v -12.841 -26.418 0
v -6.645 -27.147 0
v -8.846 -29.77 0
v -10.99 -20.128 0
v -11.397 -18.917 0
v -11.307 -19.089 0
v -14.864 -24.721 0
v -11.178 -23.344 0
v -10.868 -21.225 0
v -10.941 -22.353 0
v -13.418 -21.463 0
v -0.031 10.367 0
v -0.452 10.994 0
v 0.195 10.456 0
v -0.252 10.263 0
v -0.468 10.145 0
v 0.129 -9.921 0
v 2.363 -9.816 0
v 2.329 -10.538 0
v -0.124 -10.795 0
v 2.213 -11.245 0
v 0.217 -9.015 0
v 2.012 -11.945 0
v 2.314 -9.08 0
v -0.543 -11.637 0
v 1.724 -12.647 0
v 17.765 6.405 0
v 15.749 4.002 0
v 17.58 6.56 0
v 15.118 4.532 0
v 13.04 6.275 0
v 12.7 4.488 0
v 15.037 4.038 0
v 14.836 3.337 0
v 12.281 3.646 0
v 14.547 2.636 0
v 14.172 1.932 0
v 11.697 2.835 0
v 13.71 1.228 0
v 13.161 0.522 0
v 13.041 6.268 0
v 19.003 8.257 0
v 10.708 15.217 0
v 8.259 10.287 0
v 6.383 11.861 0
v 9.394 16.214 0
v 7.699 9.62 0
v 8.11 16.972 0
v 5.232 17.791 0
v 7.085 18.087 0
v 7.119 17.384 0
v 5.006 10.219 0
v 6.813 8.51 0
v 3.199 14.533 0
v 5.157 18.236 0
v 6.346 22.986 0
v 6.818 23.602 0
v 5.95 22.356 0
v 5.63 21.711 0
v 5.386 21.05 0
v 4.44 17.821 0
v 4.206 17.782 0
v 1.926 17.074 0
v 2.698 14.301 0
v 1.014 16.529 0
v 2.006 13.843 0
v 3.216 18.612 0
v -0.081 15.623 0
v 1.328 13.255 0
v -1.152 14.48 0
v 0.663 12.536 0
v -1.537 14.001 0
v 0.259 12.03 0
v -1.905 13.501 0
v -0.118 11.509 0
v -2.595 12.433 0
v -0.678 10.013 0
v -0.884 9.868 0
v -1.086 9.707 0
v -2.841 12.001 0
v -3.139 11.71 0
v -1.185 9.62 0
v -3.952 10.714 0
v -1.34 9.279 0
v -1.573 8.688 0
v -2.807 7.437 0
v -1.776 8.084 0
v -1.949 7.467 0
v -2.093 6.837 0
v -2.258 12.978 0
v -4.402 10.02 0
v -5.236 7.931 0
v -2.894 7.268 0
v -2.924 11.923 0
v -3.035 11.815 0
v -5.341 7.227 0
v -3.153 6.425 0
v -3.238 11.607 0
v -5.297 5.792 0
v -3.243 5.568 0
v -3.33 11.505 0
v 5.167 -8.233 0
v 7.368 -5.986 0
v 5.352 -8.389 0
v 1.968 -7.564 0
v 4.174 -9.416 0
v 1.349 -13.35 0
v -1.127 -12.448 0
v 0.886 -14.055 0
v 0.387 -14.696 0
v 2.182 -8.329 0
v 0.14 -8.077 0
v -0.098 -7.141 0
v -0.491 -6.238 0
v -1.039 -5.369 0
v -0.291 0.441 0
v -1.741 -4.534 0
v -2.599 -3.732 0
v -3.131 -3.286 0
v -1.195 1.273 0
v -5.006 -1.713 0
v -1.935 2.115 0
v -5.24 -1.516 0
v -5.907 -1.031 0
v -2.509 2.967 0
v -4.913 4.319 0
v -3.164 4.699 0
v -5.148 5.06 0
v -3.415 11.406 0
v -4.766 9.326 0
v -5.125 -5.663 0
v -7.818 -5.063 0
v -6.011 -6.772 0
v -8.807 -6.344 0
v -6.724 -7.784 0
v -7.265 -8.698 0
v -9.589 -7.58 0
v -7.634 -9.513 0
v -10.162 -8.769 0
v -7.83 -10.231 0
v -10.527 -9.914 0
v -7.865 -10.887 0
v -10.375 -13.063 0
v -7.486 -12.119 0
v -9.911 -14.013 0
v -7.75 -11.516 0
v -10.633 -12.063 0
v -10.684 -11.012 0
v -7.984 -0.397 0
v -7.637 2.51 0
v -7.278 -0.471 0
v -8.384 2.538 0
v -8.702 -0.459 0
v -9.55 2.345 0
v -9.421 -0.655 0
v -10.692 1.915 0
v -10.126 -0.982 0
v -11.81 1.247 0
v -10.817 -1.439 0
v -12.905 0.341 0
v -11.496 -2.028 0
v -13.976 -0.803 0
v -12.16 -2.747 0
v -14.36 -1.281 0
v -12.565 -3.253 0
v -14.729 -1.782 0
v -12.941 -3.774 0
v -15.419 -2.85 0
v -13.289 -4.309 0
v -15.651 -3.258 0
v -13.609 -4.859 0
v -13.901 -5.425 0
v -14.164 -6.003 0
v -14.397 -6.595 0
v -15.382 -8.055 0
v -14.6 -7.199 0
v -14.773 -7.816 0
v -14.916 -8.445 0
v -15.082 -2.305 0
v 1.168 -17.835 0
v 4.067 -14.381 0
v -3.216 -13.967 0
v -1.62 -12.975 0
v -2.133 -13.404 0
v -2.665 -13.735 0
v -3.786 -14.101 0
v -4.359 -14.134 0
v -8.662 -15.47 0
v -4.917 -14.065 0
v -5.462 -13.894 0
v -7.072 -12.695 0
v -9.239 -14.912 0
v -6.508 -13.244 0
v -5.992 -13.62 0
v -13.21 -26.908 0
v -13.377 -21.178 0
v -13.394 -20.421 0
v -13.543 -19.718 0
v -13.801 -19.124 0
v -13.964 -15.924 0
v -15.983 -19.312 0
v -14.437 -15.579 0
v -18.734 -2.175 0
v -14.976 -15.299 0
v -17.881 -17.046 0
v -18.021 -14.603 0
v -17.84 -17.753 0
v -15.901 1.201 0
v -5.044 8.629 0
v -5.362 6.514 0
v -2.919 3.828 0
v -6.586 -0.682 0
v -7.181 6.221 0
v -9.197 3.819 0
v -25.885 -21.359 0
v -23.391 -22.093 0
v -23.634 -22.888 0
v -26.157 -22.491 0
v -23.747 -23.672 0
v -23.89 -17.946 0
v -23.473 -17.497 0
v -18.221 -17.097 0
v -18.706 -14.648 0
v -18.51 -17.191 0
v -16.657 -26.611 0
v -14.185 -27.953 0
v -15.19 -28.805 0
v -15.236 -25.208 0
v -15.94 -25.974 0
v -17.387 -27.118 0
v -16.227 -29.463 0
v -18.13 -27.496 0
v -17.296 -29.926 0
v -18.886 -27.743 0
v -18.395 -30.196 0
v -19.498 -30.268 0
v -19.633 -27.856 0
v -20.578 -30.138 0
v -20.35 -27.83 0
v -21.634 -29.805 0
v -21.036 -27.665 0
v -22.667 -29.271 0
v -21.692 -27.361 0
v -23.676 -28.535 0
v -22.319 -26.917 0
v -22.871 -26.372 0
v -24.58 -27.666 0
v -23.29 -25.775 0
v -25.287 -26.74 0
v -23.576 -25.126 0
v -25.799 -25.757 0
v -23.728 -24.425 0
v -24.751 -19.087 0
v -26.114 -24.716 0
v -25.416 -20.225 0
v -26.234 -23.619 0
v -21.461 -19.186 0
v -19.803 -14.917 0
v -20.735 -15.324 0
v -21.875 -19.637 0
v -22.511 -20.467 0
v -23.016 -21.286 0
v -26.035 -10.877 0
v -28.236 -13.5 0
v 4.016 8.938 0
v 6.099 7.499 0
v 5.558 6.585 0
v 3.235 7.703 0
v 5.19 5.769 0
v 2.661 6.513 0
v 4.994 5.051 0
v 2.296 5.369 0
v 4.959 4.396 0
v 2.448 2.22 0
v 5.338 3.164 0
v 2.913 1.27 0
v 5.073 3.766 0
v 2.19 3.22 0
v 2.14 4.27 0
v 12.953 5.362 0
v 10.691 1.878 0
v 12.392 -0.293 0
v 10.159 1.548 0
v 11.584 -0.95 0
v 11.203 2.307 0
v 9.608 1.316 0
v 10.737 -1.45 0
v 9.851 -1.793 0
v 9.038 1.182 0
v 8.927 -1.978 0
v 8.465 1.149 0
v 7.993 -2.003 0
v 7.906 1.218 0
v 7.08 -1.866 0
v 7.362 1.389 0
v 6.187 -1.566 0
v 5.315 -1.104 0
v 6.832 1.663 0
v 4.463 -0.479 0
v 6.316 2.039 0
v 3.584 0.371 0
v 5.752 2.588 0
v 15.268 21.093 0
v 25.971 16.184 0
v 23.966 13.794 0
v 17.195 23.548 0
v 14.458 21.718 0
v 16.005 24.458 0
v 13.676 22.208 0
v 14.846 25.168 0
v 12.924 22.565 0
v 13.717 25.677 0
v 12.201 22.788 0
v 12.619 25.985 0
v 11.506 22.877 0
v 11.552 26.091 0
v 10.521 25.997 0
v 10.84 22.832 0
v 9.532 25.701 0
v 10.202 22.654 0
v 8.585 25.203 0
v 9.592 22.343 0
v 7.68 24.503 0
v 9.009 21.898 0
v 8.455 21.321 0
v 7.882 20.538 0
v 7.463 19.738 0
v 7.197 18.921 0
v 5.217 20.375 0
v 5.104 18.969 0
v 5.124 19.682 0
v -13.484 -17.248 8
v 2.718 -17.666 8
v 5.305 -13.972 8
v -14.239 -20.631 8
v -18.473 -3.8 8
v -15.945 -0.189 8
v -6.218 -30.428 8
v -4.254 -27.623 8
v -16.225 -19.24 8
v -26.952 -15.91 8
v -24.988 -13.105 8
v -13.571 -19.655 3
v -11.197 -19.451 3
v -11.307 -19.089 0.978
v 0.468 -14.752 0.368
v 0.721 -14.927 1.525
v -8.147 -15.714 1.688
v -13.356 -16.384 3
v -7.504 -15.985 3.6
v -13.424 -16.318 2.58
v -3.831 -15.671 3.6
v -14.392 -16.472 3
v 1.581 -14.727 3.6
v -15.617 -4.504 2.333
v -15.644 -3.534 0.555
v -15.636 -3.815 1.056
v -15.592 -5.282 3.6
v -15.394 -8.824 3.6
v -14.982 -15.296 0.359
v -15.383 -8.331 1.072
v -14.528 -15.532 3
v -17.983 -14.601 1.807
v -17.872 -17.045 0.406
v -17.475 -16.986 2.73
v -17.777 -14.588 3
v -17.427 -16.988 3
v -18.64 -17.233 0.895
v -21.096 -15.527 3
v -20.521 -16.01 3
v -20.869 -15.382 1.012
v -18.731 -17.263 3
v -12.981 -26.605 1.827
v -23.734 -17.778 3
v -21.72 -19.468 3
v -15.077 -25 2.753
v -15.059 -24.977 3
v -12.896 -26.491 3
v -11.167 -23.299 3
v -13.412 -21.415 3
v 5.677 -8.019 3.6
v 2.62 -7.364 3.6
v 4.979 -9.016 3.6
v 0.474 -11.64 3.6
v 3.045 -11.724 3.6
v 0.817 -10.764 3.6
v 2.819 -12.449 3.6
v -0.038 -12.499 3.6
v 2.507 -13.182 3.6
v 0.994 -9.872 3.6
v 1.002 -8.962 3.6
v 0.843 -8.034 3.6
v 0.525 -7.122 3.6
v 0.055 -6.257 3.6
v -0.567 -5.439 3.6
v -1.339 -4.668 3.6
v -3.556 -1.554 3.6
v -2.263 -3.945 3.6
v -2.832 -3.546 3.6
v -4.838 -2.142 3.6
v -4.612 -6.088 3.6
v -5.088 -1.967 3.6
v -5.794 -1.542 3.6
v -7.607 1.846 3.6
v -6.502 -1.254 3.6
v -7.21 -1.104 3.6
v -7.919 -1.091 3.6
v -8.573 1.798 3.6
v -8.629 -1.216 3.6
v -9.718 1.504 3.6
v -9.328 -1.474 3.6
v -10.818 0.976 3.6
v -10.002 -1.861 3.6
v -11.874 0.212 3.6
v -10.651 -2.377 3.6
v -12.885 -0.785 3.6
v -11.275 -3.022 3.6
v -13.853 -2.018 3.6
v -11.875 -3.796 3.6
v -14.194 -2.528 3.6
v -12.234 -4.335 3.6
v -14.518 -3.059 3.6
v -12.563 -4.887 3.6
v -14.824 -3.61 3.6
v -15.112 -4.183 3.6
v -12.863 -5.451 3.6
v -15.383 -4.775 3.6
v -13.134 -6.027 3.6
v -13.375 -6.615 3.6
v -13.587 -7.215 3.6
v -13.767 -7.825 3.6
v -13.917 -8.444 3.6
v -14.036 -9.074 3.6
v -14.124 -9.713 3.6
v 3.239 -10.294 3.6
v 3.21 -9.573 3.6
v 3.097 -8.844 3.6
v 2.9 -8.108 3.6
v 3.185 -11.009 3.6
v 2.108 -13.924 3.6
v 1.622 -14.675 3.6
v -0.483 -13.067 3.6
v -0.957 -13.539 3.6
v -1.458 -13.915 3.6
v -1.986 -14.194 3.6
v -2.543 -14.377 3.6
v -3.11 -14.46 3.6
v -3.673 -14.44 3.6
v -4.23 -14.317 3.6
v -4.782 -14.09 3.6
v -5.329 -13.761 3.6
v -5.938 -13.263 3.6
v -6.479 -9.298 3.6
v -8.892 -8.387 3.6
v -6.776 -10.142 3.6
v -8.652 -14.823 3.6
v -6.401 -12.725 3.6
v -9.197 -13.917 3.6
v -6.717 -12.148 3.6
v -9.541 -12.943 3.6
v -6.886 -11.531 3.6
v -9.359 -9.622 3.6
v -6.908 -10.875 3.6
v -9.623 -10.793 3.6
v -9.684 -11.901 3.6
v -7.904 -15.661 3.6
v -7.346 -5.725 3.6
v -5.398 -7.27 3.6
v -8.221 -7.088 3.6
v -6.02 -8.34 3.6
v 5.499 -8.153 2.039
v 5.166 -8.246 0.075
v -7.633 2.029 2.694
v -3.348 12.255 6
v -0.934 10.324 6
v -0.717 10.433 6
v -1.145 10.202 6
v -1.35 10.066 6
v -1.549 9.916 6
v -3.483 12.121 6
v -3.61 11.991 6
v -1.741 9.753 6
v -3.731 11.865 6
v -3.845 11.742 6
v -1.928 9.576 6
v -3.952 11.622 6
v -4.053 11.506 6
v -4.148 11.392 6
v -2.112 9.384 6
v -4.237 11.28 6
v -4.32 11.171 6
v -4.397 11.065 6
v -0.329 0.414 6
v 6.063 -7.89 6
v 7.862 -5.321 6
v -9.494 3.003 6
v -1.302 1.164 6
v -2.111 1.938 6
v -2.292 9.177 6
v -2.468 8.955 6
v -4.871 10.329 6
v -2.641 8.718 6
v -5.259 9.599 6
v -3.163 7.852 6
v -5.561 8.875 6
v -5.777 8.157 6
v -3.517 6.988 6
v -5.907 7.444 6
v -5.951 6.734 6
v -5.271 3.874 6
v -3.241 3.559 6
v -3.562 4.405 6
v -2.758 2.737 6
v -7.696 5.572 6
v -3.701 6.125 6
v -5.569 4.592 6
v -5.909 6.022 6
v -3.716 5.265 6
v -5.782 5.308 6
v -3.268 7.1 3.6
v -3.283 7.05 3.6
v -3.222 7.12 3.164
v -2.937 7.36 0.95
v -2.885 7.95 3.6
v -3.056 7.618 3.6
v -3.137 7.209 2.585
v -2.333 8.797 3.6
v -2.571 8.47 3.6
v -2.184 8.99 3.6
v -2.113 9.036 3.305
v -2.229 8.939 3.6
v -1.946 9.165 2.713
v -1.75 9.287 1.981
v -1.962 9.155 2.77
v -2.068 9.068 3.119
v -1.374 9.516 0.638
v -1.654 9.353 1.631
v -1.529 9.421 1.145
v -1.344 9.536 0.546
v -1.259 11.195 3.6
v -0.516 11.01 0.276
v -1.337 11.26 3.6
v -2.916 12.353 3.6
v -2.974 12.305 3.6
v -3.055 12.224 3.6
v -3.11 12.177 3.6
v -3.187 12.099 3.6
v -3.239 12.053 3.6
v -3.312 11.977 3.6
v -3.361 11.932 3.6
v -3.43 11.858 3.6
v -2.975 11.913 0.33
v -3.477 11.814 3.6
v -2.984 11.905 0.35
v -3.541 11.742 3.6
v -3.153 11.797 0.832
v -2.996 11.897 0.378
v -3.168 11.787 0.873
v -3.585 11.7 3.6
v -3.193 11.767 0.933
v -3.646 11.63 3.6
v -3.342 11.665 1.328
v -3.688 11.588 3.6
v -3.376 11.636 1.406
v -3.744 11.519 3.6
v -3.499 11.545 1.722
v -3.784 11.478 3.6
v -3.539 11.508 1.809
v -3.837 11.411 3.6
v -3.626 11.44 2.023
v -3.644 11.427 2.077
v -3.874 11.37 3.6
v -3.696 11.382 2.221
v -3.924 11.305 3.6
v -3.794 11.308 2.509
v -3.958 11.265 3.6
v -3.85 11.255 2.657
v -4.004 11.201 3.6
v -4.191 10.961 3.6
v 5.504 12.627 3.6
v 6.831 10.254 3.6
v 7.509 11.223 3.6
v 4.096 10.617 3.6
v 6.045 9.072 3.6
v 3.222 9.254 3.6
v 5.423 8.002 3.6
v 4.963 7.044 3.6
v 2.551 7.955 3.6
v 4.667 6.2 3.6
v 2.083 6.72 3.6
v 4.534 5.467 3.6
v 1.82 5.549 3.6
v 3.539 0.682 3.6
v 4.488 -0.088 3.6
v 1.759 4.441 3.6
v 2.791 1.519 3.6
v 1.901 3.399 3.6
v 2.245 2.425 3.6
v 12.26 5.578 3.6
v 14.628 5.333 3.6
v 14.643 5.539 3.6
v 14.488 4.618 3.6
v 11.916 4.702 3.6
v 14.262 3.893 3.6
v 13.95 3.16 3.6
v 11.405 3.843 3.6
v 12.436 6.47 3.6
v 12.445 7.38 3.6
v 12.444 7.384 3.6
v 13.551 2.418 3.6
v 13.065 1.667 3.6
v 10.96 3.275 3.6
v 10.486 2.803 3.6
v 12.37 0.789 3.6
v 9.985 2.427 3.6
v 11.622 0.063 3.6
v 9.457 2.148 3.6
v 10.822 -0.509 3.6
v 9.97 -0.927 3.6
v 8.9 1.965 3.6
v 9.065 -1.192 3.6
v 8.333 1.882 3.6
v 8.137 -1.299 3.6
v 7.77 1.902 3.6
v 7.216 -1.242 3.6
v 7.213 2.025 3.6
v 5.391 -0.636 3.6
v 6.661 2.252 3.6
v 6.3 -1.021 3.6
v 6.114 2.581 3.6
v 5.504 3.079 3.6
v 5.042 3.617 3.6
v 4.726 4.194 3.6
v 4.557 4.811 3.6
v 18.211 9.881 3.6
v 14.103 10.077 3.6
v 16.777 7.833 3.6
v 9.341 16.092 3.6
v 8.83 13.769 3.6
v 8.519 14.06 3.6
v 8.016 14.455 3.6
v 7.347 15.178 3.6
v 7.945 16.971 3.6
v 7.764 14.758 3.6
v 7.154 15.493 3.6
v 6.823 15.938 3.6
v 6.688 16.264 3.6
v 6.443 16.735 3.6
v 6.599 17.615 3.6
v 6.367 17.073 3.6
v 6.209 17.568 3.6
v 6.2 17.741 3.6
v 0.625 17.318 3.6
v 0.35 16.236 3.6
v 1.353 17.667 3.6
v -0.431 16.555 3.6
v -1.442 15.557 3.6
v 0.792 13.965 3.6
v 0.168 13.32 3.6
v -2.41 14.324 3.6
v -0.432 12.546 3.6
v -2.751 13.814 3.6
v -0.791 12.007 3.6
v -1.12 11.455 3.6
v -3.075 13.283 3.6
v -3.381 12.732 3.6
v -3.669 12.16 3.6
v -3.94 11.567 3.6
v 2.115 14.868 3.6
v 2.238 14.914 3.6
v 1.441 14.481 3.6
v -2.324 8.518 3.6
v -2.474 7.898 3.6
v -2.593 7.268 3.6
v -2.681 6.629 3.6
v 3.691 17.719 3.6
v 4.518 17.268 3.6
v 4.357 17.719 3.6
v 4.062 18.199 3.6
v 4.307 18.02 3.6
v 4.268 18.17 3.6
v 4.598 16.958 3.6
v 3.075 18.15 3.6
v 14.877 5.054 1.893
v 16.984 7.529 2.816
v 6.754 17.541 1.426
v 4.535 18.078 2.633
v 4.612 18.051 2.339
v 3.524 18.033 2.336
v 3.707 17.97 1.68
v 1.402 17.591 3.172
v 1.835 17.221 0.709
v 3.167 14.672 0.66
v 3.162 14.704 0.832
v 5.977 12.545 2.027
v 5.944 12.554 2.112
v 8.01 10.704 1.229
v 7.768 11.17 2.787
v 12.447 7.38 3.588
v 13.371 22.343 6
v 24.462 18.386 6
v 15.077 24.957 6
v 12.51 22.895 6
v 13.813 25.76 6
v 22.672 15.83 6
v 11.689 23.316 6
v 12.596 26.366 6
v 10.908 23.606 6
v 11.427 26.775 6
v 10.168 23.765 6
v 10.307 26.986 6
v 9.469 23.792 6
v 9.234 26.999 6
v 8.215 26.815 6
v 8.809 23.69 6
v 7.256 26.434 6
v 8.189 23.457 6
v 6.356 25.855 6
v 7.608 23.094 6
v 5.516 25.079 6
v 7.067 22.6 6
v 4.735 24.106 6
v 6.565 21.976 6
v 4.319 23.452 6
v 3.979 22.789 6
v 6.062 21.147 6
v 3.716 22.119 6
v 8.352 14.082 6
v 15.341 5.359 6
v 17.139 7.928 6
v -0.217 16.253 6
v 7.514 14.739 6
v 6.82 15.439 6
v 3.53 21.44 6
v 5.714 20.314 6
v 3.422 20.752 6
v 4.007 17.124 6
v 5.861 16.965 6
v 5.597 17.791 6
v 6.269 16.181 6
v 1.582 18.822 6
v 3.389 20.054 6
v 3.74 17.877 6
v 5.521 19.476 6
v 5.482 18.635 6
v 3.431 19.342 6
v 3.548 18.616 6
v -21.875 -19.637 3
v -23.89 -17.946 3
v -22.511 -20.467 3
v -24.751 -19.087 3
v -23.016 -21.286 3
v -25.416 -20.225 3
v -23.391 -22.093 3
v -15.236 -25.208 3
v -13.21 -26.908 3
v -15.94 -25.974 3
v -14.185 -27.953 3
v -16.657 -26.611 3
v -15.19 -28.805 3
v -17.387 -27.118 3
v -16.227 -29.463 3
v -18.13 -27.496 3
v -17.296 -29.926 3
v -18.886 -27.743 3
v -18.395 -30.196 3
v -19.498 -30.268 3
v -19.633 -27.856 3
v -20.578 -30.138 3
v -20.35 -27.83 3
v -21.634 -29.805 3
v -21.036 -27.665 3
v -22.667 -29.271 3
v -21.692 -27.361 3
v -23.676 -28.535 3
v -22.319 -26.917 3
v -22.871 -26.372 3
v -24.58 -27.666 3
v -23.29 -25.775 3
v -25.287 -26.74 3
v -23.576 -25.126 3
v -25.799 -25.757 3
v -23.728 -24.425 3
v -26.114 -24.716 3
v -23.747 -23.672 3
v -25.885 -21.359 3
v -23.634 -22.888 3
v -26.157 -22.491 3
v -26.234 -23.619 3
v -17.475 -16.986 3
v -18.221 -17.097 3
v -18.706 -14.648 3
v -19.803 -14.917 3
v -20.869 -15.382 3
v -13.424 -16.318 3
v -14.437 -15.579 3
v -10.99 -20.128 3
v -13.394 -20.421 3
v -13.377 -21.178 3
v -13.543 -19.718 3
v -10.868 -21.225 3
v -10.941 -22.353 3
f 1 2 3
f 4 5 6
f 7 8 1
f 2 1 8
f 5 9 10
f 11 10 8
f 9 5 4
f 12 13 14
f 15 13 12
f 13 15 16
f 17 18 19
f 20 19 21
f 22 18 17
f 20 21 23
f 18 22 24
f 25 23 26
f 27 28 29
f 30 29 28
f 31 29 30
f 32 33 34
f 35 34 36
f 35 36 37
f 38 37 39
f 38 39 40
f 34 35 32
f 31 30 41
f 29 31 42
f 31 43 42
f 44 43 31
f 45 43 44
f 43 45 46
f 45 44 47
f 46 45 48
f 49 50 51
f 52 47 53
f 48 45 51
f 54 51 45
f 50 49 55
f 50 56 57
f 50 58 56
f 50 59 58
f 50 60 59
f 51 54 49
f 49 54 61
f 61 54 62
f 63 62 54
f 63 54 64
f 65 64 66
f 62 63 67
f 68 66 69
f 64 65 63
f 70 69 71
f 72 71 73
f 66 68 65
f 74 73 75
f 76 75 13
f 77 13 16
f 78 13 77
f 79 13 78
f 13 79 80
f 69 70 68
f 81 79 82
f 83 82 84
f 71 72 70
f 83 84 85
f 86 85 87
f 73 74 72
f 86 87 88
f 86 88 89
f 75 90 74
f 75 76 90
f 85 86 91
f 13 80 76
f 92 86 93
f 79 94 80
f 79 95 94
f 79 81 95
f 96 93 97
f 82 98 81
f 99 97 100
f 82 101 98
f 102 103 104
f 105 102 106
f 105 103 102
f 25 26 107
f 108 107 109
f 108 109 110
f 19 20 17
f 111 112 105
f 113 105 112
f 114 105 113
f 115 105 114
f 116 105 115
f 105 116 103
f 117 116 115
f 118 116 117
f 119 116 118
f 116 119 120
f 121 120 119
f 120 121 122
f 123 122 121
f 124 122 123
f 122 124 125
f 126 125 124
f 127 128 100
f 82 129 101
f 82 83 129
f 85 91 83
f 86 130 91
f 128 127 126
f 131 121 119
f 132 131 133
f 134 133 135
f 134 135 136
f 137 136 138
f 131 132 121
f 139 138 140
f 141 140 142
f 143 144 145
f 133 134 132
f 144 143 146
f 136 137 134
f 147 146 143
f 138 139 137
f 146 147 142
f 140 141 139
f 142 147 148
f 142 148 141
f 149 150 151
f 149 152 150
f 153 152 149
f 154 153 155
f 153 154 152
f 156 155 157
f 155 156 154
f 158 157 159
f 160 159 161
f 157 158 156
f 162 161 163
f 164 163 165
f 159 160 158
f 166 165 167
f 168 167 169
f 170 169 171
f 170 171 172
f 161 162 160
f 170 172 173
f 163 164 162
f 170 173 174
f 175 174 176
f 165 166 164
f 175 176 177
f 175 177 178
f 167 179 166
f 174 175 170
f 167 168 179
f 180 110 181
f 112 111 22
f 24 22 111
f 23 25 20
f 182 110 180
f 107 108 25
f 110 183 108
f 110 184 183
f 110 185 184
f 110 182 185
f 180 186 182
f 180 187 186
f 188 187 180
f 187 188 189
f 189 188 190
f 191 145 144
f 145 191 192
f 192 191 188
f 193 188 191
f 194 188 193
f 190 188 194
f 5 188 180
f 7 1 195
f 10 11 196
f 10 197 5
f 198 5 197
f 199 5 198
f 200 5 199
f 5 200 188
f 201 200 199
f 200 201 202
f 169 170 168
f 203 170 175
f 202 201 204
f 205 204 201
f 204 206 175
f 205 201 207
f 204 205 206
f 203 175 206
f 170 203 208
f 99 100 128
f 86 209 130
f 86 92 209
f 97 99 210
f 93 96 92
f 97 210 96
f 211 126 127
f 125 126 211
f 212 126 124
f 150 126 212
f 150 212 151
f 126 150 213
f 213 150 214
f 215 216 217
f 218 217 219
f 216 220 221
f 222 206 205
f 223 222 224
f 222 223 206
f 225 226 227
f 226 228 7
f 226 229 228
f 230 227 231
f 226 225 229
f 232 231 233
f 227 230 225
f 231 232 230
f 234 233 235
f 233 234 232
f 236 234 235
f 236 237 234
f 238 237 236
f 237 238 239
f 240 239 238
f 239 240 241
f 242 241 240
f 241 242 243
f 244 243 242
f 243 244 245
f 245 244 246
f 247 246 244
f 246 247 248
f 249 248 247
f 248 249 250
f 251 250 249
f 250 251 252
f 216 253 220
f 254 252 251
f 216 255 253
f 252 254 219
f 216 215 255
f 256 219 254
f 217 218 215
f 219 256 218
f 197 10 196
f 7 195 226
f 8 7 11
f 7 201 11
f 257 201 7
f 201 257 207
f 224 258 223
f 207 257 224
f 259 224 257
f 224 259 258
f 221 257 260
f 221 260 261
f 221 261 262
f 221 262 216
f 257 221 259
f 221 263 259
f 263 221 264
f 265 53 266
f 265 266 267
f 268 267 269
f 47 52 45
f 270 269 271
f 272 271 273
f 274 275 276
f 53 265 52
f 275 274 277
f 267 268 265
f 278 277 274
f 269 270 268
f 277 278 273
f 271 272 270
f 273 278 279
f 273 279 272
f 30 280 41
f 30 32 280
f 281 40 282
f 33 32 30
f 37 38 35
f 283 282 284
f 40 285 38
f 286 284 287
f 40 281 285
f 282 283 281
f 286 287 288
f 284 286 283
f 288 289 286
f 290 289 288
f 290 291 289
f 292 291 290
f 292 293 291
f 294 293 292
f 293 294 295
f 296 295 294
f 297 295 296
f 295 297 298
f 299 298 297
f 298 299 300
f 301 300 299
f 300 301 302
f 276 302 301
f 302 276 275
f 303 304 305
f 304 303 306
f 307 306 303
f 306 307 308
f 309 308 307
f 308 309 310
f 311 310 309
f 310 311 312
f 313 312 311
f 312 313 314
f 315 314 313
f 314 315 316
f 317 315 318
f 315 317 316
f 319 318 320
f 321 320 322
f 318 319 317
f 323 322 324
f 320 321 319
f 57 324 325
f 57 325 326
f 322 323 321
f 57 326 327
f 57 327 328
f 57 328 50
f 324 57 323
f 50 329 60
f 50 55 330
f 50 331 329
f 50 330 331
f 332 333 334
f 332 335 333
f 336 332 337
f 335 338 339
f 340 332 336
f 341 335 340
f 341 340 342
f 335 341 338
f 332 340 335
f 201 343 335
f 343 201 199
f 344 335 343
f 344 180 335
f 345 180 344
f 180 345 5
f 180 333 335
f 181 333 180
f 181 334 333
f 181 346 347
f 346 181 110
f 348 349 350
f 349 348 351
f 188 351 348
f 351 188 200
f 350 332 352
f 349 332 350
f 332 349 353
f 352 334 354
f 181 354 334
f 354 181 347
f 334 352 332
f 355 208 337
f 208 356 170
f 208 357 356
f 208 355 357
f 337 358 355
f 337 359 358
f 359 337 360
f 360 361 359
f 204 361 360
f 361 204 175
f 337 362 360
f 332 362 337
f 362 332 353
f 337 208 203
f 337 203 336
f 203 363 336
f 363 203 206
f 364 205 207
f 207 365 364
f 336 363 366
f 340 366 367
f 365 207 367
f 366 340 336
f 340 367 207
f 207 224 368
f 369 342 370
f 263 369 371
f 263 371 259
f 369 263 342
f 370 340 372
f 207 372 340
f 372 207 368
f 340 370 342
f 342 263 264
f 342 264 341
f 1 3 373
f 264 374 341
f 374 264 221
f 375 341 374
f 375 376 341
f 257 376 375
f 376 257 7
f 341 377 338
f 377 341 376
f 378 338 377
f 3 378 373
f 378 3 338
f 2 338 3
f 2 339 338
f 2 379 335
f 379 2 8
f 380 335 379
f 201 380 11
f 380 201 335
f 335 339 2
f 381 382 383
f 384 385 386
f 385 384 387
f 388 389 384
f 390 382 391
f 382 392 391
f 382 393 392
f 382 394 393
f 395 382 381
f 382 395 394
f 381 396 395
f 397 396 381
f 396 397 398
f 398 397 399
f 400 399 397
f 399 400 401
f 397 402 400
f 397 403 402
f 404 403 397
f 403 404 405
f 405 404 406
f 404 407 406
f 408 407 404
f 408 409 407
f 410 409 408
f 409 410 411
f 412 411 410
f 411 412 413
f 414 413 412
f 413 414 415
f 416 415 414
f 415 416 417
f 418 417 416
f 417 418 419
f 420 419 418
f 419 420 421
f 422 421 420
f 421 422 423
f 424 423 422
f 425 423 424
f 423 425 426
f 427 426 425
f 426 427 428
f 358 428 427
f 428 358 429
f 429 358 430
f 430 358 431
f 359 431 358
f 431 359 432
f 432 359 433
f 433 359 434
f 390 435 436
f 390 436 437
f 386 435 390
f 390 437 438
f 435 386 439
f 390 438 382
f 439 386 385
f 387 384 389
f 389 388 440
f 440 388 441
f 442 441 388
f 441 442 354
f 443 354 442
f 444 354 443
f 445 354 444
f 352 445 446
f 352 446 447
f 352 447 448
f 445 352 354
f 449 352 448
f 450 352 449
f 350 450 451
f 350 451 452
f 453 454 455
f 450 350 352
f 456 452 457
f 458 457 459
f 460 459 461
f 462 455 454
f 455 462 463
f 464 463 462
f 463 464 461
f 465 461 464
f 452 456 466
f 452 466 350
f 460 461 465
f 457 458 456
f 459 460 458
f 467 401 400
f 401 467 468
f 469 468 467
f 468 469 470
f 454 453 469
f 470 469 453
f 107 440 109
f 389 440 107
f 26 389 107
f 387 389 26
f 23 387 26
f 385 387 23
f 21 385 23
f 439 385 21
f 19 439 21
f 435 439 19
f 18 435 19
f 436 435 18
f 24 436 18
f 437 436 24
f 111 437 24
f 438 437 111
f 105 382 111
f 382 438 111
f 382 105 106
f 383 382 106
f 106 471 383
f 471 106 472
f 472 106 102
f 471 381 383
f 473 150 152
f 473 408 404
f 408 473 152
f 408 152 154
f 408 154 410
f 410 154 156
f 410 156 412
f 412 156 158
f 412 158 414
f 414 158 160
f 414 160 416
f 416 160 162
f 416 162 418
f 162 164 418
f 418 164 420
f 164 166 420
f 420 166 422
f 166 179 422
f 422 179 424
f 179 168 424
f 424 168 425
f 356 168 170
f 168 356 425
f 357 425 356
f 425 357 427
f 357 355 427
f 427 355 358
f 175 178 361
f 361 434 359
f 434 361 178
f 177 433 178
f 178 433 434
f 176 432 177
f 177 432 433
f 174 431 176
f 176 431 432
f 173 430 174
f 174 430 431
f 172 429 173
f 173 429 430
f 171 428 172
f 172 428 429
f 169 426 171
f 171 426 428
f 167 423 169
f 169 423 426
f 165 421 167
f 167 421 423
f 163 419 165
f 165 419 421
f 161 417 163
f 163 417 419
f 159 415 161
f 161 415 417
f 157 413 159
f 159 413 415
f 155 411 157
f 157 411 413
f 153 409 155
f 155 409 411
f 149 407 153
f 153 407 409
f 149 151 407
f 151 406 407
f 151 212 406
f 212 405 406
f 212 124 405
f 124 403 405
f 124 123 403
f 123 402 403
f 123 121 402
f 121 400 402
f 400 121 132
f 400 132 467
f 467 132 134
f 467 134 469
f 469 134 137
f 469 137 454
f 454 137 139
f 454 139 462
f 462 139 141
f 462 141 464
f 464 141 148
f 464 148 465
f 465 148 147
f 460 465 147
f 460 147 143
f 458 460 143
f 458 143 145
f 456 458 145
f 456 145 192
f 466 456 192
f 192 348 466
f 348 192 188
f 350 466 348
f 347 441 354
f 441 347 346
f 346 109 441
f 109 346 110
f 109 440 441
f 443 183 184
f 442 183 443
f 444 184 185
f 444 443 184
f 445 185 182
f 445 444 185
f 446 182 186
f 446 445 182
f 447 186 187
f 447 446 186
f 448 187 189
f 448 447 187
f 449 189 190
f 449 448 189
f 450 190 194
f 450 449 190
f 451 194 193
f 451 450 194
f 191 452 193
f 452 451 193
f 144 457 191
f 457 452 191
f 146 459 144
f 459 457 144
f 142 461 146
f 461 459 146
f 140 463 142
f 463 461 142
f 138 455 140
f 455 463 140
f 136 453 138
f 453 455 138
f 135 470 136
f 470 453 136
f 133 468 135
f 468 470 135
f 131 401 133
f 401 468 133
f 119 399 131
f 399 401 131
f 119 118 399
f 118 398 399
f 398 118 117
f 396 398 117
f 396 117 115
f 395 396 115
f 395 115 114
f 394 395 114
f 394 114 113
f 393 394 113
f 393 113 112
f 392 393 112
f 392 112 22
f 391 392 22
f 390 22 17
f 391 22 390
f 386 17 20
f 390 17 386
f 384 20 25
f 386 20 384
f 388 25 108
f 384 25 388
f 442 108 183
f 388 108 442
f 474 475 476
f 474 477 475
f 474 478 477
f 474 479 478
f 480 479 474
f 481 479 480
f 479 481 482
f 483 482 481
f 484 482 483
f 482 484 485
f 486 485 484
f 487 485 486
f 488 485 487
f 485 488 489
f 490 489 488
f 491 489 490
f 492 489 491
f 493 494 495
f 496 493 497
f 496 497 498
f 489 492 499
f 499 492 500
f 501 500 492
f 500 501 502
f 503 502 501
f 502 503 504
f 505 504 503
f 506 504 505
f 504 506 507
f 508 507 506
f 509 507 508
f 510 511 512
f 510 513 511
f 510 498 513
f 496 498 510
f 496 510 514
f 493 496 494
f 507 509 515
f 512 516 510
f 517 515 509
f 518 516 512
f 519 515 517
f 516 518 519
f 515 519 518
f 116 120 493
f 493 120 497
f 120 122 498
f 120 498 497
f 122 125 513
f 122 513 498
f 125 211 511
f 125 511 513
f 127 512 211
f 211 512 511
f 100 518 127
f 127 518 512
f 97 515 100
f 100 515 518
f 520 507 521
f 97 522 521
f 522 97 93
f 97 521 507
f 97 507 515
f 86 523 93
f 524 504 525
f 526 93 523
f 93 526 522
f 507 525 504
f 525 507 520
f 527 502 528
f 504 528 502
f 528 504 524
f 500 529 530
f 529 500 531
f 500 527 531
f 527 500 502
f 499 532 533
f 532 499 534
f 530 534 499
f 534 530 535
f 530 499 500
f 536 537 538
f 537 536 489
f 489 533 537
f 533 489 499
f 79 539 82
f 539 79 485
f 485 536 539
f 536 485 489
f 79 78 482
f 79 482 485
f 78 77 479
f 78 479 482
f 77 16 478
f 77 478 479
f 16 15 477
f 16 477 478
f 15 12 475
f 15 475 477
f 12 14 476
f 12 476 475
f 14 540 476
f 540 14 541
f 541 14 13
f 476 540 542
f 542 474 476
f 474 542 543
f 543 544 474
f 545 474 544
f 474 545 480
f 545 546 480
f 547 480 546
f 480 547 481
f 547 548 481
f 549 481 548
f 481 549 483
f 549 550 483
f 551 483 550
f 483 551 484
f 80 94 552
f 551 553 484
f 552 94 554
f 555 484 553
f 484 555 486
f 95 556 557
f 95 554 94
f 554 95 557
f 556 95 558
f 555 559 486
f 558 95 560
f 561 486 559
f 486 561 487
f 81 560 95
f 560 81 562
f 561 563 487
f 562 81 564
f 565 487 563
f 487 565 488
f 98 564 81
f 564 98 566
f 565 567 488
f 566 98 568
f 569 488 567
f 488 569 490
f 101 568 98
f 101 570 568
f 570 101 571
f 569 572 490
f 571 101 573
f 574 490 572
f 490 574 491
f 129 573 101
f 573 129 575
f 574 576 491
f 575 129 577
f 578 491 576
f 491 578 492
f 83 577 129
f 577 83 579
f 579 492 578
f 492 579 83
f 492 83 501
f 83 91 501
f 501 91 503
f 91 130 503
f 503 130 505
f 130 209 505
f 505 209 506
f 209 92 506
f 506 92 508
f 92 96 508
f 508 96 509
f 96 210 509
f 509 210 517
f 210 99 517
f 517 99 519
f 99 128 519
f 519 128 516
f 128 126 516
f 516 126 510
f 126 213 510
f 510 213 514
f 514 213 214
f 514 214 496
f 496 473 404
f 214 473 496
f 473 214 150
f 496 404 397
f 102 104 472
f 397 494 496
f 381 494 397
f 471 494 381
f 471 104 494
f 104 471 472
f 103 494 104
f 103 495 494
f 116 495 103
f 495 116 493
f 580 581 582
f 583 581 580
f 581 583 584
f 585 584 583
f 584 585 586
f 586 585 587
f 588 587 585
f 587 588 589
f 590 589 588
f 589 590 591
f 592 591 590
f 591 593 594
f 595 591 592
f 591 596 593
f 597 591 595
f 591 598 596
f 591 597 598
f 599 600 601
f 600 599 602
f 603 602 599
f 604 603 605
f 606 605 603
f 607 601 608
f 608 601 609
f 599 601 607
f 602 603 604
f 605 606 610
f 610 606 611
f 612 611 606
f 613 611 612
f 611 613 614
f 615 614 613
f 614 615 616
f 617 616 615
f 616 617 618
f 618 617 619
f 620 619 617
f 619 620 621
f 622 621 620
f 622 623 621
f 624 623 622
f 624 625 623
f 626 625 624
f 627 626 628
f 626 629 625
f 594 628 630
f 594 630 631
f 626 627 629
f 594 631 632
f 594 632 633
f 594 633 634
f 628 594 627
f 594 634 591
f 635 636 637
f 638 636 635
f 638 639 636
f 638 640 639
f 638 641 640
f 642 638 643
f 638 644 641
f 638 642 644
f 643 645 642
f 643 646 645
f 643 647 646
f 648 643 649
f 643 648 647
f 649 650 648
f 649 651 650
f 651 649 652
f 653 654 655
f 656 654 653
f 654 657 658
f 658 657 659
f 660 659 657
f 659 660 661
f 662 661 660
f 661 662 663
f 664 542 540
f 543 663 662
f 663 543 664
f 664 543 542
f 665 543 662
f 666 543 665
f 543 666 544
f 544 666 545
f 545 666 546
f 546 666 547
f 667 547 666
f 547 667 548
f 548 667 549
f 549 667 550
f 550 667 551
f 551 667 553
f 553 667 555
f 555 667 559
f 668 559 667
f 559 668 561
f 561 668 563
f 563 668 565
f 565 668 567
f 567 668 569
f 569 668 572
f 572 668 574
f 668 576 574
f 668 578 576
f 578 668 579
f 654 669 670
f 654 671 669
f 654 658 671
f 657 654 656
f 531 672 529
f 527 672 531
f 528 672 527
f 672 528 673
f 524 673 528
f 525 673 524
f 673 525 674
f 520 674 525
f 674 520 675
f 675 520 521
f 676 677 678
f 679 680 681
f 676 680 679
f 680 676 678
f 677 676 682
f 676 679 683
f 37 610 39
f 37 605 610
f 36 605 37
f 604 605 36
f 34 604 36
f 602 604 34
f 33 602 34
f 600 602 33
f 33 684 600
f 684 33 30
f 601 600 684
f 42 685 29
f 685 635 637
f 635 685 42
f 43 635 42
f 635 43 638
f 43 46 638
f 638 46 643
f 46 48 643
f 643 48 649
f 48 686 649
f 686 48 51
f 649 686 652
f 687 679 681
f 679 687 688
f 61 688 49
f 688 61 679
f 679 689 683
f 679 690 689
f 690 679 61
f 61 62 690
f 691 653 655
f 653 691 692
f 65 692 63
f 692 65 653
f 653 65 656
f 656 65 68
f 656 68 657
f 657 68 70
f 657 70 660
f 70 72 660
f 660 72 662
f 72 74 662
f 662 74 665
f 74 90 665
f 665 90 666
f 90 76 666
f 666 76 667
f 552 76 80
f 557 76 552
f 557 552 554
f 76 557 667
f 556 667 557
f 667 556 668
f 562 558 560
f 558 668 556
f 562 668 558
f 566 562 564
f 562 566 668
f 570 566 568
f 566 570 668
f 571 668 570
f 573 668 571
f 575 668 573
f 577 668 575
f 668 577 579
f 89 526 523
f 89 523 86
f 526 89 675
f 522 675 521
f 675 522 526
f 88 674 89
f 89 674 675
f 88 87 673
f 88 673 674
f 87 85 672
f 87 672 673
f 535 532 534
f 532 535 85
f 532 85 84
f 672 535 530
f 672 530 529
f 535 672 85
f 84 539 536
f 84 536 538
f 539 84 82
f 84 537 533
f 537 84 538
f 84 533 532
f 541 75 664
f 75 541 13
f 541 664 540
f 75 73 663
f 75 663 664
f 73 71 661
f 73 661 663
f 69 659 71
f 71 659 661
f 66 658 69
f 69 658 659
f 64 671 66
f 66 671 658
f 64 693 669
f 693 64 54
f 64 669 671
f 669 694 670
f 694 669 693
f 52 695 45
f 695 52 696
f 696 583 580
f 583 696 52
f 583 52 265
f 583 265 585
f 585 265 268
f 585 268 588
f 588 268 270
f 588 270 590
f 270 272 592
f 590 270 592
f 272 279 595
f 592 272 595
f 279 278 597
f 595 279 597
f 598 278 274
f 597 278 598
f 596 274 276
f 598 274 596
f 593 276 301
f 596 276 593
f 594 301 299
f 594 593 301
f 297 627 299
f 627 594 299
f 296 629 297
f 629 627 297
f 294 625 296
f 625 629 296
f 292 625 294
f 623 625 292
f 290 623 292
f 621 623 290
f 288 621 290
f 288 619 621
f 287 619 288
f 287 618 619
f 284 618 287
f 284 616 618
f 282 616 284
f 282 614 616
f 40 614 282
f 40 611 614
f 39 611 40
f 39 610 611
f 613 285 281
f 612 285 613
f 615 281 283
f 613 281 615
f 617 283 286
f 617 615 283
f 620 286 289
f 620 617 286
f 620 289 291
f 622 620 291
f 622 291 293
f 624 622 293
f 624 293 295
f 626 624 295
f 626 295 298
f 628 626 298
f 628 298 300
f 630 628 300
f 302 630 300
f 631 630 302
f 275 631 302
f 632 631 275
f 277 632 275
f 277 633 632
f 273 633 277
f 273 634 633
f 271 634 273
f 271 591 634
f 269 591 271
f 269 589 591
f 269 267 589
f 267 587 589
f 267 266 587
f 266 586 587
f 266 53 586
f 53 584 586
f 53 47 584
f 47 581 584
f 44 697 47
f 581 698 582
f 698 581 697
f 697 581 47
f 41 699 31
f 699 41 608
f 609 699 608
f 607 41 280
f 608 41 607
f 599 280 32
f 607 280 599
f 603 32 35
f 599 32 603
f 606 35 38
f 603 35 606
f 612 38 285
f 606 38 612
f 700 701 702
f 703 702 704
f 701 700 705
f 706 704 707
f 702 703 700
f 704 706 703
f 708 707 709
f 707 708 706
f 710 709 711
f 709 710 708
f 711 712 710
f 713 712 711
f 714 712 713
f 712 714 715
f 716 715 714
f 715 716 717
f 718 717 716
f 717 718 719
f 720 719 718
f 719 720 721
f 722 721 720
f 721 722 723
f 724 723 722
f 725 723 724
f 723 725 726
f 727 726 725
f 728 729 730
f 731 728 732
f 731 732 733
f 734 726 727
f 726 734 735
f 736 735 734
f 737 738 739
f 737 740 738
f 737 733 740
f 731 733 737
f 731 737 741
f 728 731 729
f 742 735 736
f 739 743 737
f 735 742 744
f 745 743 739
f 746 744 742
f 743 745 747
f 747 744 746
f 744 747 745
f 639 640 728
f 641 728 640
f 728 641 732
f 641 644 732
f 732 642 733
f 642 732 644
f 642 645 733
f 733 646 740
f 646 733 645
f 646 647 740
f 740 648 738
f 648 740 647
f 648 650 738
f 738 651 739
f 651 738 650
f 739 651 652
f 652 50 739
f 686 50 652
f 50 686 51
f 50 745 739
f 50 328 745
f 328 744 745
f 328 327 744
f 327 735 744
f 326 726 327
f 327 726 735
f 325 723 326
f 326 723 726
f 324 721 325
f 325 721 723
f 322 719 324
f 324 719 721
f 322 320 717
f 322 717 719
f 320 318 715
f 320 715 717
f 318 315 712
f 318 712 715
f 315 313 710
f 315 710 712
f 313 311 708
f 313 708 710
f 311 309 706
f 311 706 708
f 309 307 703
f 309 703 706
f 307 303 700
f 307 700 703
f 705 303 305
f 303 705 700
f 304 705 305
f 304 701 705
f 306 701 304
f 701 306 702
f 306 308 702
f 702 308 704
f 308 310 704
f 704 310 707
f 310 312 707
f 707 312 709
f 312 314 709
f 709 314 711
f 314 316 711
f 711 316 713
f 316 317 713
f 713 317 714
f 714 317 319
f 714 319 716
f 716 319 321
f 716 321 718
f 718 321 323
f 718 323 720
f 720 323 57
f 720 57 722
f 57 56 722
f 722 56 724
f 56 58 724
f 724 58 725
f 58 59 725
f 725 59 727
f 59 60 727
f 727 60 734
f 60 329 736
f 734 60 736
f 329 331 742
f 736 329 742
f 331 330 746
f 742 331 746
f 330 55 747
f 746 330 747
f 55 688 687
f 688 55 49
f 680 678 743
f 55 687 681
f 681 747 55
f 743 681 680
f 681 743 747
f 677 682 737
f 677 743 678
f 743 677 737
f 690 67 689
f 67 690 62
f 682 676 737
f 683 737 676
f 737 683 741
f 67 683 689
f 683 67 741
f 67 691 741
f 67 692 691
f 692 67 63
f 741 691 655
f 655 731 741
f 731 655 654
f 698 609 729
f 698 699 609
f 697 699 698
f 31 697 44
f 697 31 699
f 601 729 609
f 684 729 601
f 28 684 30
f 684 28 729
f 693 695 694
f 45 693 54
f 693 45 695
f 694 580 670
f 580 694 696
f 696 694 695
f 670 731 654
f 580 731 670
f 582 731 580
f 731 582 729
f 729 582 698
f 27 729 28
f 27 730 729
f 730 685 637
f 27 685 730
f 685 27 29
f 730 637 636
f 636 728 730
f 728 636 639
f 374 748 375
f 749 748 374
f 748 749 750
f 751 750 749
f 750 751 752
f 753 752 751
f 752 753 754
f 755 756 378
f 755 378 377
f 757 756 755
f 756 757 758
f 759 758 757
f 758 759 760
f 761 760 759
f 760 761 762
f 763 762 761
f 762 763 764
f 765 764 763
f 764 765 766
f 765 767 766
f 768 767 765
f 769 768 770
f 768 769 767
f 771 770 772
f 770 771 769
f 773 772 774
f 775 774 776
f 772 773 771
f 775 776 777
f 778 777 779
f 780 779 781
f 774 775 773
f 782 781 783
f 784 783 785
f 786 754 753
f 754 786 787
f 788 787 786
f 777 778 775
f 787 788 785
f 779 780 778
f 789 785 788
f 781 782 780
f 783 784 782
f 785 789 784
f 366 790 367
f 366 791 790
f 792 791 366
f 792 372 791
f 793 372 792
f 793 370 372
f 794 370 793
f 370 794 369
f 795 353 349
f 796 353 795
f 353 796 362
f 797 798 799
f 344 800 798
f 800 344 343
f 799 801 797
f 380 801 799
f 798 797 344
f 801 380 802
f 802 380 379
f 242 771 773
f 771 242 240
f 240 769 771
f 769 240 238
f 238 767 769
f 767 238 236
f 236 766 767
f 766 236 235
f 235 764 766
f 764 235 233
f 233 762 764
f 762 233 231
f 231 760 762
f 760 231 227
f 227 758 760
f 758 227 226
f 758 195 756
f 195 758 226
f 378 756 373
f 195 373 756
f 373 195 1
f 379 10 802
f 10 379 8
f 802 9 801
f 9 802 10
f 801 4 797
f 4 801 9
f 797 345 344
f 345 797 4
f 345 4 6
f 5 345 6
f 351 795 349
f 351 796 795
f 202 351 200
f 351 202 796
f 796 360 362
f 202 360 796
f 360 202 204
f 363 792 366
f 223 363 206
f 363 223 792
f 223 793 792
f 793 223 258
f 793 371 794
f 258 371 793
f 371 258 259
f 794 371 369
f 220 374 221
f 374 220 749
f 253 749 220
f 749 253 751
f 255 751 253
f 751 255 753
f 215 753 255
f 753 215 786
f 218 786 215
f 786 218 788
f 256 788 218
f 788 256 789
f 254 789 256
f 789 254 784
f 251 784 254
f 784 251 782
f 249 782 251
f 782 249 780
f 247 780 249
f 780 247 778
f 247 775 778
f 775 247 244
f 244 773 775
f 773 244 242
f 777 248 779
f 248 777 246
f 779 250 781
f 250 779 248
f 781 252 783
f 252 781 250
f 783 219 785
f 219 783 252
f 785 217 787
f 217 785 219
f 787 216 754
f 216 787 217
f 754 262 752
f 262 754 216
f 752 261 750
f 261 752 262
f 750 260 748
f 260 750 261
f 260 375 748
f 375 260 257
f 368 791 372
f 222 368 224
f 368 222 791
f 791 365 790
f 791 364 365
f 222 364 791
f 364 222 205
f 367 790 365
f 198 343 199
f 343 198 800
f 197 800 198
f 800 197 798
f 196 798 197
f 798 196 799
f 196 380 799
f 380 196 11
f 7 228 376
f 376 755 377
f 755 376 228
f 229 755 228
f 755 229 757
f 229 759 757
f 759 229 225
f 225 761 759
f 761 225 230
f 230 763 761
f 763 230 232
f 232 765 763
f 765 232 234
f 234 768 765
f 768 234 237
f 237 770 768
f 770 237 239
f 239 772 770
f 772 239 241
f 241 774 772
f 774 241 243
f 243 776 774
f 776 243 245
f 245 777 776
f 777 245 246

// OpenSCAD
Font_name = "Chewy";
Text = "Karan";
Rotation = 50;
Connect_dots = true;
Dot_bridge_height_percent = 40;

function char_w(c) = 
    (c == "m" || c == "w") ? 15.0 :
    (c == "i" || c == "l" || c == "j" || c == "t" || c == "f") ? 7.5 :
    (c >= "A" && c <= "Z") ? 14.0 :
    10.5;

function get_step_at(text, i) = 
    (i <= 0) ? 0 :
    ((char_w(text[i-1]) + char_w(text[i])) / 2 * 0.95);

function get_char_x_auto(text, i) = 
    (i <= 0) ? 0 : (get_char_x_auto(text, i - 1) + get_step_at(text, i));

span = get_char_x_auto(Text, len(Text)-1);
cx = span / 2;
loop_x = -cx - 8.5;
loop_y = 0;
twist = -5;
$fn = 32;

rotate([0, 0, Rotation]) {
    union() {
        // Loop
        color("DimGray")
        linear_extrude(height = 3, $fn = $fn)
            translate([loop_x, loop_y, 0]) rotate([0, 0, -90])
                text(size = 20, text = "o", font = Font_name, halign = "center", valign = "center", $fn = $fn);

        // Letters
        for (i = [0 : len(Text) - 1]) {
            h = (i == 0) ? 8.0 : ((i % 2 == 0) ? 6.0 : 3.6);
            char = Text[i];
            char_x = get_char_x_auto(Text, i) - cx;

            color([0.92, 0.72, 0.1]) {
                // Main letter extrusion (full height h)
                linear_extrude(height = h, twist = twist, $fn = $fn)
                    translate([char_x, 0, 0])
                        text(size = 25, text = char, font = Font_name, halign = "center", valign = "center", $fn = $fn);

                // Recessed bridge at 40% height (retains strength, preserves top surface aesthetics)
                if (Connect_dots) {
                    bridge_factor = Dot_bridge_height_percent / 100;
                    bridge_h = h * bridge_factor;
                    bridge_twist = twist * bridge_factor;
                    if (char == "i") {
                        linear_extrude(height = bridge_h, twist = bridge_twist, $fn = $fn)
                            translate([char_x, 0, 0])
                                translate([-1.2, 6.5]) square([2.4, 4.0]);
                    }
                    if (char == "j") {
                        linear_extrude(height = bridge_h, twist = bridge_twist, $fn = $fn)
                            translate([char_x, 0, 0])
                                translate([-1.2, 11.0]) square([2.4, 4.0]);
                    }
                }
            }
        }
    }
}
